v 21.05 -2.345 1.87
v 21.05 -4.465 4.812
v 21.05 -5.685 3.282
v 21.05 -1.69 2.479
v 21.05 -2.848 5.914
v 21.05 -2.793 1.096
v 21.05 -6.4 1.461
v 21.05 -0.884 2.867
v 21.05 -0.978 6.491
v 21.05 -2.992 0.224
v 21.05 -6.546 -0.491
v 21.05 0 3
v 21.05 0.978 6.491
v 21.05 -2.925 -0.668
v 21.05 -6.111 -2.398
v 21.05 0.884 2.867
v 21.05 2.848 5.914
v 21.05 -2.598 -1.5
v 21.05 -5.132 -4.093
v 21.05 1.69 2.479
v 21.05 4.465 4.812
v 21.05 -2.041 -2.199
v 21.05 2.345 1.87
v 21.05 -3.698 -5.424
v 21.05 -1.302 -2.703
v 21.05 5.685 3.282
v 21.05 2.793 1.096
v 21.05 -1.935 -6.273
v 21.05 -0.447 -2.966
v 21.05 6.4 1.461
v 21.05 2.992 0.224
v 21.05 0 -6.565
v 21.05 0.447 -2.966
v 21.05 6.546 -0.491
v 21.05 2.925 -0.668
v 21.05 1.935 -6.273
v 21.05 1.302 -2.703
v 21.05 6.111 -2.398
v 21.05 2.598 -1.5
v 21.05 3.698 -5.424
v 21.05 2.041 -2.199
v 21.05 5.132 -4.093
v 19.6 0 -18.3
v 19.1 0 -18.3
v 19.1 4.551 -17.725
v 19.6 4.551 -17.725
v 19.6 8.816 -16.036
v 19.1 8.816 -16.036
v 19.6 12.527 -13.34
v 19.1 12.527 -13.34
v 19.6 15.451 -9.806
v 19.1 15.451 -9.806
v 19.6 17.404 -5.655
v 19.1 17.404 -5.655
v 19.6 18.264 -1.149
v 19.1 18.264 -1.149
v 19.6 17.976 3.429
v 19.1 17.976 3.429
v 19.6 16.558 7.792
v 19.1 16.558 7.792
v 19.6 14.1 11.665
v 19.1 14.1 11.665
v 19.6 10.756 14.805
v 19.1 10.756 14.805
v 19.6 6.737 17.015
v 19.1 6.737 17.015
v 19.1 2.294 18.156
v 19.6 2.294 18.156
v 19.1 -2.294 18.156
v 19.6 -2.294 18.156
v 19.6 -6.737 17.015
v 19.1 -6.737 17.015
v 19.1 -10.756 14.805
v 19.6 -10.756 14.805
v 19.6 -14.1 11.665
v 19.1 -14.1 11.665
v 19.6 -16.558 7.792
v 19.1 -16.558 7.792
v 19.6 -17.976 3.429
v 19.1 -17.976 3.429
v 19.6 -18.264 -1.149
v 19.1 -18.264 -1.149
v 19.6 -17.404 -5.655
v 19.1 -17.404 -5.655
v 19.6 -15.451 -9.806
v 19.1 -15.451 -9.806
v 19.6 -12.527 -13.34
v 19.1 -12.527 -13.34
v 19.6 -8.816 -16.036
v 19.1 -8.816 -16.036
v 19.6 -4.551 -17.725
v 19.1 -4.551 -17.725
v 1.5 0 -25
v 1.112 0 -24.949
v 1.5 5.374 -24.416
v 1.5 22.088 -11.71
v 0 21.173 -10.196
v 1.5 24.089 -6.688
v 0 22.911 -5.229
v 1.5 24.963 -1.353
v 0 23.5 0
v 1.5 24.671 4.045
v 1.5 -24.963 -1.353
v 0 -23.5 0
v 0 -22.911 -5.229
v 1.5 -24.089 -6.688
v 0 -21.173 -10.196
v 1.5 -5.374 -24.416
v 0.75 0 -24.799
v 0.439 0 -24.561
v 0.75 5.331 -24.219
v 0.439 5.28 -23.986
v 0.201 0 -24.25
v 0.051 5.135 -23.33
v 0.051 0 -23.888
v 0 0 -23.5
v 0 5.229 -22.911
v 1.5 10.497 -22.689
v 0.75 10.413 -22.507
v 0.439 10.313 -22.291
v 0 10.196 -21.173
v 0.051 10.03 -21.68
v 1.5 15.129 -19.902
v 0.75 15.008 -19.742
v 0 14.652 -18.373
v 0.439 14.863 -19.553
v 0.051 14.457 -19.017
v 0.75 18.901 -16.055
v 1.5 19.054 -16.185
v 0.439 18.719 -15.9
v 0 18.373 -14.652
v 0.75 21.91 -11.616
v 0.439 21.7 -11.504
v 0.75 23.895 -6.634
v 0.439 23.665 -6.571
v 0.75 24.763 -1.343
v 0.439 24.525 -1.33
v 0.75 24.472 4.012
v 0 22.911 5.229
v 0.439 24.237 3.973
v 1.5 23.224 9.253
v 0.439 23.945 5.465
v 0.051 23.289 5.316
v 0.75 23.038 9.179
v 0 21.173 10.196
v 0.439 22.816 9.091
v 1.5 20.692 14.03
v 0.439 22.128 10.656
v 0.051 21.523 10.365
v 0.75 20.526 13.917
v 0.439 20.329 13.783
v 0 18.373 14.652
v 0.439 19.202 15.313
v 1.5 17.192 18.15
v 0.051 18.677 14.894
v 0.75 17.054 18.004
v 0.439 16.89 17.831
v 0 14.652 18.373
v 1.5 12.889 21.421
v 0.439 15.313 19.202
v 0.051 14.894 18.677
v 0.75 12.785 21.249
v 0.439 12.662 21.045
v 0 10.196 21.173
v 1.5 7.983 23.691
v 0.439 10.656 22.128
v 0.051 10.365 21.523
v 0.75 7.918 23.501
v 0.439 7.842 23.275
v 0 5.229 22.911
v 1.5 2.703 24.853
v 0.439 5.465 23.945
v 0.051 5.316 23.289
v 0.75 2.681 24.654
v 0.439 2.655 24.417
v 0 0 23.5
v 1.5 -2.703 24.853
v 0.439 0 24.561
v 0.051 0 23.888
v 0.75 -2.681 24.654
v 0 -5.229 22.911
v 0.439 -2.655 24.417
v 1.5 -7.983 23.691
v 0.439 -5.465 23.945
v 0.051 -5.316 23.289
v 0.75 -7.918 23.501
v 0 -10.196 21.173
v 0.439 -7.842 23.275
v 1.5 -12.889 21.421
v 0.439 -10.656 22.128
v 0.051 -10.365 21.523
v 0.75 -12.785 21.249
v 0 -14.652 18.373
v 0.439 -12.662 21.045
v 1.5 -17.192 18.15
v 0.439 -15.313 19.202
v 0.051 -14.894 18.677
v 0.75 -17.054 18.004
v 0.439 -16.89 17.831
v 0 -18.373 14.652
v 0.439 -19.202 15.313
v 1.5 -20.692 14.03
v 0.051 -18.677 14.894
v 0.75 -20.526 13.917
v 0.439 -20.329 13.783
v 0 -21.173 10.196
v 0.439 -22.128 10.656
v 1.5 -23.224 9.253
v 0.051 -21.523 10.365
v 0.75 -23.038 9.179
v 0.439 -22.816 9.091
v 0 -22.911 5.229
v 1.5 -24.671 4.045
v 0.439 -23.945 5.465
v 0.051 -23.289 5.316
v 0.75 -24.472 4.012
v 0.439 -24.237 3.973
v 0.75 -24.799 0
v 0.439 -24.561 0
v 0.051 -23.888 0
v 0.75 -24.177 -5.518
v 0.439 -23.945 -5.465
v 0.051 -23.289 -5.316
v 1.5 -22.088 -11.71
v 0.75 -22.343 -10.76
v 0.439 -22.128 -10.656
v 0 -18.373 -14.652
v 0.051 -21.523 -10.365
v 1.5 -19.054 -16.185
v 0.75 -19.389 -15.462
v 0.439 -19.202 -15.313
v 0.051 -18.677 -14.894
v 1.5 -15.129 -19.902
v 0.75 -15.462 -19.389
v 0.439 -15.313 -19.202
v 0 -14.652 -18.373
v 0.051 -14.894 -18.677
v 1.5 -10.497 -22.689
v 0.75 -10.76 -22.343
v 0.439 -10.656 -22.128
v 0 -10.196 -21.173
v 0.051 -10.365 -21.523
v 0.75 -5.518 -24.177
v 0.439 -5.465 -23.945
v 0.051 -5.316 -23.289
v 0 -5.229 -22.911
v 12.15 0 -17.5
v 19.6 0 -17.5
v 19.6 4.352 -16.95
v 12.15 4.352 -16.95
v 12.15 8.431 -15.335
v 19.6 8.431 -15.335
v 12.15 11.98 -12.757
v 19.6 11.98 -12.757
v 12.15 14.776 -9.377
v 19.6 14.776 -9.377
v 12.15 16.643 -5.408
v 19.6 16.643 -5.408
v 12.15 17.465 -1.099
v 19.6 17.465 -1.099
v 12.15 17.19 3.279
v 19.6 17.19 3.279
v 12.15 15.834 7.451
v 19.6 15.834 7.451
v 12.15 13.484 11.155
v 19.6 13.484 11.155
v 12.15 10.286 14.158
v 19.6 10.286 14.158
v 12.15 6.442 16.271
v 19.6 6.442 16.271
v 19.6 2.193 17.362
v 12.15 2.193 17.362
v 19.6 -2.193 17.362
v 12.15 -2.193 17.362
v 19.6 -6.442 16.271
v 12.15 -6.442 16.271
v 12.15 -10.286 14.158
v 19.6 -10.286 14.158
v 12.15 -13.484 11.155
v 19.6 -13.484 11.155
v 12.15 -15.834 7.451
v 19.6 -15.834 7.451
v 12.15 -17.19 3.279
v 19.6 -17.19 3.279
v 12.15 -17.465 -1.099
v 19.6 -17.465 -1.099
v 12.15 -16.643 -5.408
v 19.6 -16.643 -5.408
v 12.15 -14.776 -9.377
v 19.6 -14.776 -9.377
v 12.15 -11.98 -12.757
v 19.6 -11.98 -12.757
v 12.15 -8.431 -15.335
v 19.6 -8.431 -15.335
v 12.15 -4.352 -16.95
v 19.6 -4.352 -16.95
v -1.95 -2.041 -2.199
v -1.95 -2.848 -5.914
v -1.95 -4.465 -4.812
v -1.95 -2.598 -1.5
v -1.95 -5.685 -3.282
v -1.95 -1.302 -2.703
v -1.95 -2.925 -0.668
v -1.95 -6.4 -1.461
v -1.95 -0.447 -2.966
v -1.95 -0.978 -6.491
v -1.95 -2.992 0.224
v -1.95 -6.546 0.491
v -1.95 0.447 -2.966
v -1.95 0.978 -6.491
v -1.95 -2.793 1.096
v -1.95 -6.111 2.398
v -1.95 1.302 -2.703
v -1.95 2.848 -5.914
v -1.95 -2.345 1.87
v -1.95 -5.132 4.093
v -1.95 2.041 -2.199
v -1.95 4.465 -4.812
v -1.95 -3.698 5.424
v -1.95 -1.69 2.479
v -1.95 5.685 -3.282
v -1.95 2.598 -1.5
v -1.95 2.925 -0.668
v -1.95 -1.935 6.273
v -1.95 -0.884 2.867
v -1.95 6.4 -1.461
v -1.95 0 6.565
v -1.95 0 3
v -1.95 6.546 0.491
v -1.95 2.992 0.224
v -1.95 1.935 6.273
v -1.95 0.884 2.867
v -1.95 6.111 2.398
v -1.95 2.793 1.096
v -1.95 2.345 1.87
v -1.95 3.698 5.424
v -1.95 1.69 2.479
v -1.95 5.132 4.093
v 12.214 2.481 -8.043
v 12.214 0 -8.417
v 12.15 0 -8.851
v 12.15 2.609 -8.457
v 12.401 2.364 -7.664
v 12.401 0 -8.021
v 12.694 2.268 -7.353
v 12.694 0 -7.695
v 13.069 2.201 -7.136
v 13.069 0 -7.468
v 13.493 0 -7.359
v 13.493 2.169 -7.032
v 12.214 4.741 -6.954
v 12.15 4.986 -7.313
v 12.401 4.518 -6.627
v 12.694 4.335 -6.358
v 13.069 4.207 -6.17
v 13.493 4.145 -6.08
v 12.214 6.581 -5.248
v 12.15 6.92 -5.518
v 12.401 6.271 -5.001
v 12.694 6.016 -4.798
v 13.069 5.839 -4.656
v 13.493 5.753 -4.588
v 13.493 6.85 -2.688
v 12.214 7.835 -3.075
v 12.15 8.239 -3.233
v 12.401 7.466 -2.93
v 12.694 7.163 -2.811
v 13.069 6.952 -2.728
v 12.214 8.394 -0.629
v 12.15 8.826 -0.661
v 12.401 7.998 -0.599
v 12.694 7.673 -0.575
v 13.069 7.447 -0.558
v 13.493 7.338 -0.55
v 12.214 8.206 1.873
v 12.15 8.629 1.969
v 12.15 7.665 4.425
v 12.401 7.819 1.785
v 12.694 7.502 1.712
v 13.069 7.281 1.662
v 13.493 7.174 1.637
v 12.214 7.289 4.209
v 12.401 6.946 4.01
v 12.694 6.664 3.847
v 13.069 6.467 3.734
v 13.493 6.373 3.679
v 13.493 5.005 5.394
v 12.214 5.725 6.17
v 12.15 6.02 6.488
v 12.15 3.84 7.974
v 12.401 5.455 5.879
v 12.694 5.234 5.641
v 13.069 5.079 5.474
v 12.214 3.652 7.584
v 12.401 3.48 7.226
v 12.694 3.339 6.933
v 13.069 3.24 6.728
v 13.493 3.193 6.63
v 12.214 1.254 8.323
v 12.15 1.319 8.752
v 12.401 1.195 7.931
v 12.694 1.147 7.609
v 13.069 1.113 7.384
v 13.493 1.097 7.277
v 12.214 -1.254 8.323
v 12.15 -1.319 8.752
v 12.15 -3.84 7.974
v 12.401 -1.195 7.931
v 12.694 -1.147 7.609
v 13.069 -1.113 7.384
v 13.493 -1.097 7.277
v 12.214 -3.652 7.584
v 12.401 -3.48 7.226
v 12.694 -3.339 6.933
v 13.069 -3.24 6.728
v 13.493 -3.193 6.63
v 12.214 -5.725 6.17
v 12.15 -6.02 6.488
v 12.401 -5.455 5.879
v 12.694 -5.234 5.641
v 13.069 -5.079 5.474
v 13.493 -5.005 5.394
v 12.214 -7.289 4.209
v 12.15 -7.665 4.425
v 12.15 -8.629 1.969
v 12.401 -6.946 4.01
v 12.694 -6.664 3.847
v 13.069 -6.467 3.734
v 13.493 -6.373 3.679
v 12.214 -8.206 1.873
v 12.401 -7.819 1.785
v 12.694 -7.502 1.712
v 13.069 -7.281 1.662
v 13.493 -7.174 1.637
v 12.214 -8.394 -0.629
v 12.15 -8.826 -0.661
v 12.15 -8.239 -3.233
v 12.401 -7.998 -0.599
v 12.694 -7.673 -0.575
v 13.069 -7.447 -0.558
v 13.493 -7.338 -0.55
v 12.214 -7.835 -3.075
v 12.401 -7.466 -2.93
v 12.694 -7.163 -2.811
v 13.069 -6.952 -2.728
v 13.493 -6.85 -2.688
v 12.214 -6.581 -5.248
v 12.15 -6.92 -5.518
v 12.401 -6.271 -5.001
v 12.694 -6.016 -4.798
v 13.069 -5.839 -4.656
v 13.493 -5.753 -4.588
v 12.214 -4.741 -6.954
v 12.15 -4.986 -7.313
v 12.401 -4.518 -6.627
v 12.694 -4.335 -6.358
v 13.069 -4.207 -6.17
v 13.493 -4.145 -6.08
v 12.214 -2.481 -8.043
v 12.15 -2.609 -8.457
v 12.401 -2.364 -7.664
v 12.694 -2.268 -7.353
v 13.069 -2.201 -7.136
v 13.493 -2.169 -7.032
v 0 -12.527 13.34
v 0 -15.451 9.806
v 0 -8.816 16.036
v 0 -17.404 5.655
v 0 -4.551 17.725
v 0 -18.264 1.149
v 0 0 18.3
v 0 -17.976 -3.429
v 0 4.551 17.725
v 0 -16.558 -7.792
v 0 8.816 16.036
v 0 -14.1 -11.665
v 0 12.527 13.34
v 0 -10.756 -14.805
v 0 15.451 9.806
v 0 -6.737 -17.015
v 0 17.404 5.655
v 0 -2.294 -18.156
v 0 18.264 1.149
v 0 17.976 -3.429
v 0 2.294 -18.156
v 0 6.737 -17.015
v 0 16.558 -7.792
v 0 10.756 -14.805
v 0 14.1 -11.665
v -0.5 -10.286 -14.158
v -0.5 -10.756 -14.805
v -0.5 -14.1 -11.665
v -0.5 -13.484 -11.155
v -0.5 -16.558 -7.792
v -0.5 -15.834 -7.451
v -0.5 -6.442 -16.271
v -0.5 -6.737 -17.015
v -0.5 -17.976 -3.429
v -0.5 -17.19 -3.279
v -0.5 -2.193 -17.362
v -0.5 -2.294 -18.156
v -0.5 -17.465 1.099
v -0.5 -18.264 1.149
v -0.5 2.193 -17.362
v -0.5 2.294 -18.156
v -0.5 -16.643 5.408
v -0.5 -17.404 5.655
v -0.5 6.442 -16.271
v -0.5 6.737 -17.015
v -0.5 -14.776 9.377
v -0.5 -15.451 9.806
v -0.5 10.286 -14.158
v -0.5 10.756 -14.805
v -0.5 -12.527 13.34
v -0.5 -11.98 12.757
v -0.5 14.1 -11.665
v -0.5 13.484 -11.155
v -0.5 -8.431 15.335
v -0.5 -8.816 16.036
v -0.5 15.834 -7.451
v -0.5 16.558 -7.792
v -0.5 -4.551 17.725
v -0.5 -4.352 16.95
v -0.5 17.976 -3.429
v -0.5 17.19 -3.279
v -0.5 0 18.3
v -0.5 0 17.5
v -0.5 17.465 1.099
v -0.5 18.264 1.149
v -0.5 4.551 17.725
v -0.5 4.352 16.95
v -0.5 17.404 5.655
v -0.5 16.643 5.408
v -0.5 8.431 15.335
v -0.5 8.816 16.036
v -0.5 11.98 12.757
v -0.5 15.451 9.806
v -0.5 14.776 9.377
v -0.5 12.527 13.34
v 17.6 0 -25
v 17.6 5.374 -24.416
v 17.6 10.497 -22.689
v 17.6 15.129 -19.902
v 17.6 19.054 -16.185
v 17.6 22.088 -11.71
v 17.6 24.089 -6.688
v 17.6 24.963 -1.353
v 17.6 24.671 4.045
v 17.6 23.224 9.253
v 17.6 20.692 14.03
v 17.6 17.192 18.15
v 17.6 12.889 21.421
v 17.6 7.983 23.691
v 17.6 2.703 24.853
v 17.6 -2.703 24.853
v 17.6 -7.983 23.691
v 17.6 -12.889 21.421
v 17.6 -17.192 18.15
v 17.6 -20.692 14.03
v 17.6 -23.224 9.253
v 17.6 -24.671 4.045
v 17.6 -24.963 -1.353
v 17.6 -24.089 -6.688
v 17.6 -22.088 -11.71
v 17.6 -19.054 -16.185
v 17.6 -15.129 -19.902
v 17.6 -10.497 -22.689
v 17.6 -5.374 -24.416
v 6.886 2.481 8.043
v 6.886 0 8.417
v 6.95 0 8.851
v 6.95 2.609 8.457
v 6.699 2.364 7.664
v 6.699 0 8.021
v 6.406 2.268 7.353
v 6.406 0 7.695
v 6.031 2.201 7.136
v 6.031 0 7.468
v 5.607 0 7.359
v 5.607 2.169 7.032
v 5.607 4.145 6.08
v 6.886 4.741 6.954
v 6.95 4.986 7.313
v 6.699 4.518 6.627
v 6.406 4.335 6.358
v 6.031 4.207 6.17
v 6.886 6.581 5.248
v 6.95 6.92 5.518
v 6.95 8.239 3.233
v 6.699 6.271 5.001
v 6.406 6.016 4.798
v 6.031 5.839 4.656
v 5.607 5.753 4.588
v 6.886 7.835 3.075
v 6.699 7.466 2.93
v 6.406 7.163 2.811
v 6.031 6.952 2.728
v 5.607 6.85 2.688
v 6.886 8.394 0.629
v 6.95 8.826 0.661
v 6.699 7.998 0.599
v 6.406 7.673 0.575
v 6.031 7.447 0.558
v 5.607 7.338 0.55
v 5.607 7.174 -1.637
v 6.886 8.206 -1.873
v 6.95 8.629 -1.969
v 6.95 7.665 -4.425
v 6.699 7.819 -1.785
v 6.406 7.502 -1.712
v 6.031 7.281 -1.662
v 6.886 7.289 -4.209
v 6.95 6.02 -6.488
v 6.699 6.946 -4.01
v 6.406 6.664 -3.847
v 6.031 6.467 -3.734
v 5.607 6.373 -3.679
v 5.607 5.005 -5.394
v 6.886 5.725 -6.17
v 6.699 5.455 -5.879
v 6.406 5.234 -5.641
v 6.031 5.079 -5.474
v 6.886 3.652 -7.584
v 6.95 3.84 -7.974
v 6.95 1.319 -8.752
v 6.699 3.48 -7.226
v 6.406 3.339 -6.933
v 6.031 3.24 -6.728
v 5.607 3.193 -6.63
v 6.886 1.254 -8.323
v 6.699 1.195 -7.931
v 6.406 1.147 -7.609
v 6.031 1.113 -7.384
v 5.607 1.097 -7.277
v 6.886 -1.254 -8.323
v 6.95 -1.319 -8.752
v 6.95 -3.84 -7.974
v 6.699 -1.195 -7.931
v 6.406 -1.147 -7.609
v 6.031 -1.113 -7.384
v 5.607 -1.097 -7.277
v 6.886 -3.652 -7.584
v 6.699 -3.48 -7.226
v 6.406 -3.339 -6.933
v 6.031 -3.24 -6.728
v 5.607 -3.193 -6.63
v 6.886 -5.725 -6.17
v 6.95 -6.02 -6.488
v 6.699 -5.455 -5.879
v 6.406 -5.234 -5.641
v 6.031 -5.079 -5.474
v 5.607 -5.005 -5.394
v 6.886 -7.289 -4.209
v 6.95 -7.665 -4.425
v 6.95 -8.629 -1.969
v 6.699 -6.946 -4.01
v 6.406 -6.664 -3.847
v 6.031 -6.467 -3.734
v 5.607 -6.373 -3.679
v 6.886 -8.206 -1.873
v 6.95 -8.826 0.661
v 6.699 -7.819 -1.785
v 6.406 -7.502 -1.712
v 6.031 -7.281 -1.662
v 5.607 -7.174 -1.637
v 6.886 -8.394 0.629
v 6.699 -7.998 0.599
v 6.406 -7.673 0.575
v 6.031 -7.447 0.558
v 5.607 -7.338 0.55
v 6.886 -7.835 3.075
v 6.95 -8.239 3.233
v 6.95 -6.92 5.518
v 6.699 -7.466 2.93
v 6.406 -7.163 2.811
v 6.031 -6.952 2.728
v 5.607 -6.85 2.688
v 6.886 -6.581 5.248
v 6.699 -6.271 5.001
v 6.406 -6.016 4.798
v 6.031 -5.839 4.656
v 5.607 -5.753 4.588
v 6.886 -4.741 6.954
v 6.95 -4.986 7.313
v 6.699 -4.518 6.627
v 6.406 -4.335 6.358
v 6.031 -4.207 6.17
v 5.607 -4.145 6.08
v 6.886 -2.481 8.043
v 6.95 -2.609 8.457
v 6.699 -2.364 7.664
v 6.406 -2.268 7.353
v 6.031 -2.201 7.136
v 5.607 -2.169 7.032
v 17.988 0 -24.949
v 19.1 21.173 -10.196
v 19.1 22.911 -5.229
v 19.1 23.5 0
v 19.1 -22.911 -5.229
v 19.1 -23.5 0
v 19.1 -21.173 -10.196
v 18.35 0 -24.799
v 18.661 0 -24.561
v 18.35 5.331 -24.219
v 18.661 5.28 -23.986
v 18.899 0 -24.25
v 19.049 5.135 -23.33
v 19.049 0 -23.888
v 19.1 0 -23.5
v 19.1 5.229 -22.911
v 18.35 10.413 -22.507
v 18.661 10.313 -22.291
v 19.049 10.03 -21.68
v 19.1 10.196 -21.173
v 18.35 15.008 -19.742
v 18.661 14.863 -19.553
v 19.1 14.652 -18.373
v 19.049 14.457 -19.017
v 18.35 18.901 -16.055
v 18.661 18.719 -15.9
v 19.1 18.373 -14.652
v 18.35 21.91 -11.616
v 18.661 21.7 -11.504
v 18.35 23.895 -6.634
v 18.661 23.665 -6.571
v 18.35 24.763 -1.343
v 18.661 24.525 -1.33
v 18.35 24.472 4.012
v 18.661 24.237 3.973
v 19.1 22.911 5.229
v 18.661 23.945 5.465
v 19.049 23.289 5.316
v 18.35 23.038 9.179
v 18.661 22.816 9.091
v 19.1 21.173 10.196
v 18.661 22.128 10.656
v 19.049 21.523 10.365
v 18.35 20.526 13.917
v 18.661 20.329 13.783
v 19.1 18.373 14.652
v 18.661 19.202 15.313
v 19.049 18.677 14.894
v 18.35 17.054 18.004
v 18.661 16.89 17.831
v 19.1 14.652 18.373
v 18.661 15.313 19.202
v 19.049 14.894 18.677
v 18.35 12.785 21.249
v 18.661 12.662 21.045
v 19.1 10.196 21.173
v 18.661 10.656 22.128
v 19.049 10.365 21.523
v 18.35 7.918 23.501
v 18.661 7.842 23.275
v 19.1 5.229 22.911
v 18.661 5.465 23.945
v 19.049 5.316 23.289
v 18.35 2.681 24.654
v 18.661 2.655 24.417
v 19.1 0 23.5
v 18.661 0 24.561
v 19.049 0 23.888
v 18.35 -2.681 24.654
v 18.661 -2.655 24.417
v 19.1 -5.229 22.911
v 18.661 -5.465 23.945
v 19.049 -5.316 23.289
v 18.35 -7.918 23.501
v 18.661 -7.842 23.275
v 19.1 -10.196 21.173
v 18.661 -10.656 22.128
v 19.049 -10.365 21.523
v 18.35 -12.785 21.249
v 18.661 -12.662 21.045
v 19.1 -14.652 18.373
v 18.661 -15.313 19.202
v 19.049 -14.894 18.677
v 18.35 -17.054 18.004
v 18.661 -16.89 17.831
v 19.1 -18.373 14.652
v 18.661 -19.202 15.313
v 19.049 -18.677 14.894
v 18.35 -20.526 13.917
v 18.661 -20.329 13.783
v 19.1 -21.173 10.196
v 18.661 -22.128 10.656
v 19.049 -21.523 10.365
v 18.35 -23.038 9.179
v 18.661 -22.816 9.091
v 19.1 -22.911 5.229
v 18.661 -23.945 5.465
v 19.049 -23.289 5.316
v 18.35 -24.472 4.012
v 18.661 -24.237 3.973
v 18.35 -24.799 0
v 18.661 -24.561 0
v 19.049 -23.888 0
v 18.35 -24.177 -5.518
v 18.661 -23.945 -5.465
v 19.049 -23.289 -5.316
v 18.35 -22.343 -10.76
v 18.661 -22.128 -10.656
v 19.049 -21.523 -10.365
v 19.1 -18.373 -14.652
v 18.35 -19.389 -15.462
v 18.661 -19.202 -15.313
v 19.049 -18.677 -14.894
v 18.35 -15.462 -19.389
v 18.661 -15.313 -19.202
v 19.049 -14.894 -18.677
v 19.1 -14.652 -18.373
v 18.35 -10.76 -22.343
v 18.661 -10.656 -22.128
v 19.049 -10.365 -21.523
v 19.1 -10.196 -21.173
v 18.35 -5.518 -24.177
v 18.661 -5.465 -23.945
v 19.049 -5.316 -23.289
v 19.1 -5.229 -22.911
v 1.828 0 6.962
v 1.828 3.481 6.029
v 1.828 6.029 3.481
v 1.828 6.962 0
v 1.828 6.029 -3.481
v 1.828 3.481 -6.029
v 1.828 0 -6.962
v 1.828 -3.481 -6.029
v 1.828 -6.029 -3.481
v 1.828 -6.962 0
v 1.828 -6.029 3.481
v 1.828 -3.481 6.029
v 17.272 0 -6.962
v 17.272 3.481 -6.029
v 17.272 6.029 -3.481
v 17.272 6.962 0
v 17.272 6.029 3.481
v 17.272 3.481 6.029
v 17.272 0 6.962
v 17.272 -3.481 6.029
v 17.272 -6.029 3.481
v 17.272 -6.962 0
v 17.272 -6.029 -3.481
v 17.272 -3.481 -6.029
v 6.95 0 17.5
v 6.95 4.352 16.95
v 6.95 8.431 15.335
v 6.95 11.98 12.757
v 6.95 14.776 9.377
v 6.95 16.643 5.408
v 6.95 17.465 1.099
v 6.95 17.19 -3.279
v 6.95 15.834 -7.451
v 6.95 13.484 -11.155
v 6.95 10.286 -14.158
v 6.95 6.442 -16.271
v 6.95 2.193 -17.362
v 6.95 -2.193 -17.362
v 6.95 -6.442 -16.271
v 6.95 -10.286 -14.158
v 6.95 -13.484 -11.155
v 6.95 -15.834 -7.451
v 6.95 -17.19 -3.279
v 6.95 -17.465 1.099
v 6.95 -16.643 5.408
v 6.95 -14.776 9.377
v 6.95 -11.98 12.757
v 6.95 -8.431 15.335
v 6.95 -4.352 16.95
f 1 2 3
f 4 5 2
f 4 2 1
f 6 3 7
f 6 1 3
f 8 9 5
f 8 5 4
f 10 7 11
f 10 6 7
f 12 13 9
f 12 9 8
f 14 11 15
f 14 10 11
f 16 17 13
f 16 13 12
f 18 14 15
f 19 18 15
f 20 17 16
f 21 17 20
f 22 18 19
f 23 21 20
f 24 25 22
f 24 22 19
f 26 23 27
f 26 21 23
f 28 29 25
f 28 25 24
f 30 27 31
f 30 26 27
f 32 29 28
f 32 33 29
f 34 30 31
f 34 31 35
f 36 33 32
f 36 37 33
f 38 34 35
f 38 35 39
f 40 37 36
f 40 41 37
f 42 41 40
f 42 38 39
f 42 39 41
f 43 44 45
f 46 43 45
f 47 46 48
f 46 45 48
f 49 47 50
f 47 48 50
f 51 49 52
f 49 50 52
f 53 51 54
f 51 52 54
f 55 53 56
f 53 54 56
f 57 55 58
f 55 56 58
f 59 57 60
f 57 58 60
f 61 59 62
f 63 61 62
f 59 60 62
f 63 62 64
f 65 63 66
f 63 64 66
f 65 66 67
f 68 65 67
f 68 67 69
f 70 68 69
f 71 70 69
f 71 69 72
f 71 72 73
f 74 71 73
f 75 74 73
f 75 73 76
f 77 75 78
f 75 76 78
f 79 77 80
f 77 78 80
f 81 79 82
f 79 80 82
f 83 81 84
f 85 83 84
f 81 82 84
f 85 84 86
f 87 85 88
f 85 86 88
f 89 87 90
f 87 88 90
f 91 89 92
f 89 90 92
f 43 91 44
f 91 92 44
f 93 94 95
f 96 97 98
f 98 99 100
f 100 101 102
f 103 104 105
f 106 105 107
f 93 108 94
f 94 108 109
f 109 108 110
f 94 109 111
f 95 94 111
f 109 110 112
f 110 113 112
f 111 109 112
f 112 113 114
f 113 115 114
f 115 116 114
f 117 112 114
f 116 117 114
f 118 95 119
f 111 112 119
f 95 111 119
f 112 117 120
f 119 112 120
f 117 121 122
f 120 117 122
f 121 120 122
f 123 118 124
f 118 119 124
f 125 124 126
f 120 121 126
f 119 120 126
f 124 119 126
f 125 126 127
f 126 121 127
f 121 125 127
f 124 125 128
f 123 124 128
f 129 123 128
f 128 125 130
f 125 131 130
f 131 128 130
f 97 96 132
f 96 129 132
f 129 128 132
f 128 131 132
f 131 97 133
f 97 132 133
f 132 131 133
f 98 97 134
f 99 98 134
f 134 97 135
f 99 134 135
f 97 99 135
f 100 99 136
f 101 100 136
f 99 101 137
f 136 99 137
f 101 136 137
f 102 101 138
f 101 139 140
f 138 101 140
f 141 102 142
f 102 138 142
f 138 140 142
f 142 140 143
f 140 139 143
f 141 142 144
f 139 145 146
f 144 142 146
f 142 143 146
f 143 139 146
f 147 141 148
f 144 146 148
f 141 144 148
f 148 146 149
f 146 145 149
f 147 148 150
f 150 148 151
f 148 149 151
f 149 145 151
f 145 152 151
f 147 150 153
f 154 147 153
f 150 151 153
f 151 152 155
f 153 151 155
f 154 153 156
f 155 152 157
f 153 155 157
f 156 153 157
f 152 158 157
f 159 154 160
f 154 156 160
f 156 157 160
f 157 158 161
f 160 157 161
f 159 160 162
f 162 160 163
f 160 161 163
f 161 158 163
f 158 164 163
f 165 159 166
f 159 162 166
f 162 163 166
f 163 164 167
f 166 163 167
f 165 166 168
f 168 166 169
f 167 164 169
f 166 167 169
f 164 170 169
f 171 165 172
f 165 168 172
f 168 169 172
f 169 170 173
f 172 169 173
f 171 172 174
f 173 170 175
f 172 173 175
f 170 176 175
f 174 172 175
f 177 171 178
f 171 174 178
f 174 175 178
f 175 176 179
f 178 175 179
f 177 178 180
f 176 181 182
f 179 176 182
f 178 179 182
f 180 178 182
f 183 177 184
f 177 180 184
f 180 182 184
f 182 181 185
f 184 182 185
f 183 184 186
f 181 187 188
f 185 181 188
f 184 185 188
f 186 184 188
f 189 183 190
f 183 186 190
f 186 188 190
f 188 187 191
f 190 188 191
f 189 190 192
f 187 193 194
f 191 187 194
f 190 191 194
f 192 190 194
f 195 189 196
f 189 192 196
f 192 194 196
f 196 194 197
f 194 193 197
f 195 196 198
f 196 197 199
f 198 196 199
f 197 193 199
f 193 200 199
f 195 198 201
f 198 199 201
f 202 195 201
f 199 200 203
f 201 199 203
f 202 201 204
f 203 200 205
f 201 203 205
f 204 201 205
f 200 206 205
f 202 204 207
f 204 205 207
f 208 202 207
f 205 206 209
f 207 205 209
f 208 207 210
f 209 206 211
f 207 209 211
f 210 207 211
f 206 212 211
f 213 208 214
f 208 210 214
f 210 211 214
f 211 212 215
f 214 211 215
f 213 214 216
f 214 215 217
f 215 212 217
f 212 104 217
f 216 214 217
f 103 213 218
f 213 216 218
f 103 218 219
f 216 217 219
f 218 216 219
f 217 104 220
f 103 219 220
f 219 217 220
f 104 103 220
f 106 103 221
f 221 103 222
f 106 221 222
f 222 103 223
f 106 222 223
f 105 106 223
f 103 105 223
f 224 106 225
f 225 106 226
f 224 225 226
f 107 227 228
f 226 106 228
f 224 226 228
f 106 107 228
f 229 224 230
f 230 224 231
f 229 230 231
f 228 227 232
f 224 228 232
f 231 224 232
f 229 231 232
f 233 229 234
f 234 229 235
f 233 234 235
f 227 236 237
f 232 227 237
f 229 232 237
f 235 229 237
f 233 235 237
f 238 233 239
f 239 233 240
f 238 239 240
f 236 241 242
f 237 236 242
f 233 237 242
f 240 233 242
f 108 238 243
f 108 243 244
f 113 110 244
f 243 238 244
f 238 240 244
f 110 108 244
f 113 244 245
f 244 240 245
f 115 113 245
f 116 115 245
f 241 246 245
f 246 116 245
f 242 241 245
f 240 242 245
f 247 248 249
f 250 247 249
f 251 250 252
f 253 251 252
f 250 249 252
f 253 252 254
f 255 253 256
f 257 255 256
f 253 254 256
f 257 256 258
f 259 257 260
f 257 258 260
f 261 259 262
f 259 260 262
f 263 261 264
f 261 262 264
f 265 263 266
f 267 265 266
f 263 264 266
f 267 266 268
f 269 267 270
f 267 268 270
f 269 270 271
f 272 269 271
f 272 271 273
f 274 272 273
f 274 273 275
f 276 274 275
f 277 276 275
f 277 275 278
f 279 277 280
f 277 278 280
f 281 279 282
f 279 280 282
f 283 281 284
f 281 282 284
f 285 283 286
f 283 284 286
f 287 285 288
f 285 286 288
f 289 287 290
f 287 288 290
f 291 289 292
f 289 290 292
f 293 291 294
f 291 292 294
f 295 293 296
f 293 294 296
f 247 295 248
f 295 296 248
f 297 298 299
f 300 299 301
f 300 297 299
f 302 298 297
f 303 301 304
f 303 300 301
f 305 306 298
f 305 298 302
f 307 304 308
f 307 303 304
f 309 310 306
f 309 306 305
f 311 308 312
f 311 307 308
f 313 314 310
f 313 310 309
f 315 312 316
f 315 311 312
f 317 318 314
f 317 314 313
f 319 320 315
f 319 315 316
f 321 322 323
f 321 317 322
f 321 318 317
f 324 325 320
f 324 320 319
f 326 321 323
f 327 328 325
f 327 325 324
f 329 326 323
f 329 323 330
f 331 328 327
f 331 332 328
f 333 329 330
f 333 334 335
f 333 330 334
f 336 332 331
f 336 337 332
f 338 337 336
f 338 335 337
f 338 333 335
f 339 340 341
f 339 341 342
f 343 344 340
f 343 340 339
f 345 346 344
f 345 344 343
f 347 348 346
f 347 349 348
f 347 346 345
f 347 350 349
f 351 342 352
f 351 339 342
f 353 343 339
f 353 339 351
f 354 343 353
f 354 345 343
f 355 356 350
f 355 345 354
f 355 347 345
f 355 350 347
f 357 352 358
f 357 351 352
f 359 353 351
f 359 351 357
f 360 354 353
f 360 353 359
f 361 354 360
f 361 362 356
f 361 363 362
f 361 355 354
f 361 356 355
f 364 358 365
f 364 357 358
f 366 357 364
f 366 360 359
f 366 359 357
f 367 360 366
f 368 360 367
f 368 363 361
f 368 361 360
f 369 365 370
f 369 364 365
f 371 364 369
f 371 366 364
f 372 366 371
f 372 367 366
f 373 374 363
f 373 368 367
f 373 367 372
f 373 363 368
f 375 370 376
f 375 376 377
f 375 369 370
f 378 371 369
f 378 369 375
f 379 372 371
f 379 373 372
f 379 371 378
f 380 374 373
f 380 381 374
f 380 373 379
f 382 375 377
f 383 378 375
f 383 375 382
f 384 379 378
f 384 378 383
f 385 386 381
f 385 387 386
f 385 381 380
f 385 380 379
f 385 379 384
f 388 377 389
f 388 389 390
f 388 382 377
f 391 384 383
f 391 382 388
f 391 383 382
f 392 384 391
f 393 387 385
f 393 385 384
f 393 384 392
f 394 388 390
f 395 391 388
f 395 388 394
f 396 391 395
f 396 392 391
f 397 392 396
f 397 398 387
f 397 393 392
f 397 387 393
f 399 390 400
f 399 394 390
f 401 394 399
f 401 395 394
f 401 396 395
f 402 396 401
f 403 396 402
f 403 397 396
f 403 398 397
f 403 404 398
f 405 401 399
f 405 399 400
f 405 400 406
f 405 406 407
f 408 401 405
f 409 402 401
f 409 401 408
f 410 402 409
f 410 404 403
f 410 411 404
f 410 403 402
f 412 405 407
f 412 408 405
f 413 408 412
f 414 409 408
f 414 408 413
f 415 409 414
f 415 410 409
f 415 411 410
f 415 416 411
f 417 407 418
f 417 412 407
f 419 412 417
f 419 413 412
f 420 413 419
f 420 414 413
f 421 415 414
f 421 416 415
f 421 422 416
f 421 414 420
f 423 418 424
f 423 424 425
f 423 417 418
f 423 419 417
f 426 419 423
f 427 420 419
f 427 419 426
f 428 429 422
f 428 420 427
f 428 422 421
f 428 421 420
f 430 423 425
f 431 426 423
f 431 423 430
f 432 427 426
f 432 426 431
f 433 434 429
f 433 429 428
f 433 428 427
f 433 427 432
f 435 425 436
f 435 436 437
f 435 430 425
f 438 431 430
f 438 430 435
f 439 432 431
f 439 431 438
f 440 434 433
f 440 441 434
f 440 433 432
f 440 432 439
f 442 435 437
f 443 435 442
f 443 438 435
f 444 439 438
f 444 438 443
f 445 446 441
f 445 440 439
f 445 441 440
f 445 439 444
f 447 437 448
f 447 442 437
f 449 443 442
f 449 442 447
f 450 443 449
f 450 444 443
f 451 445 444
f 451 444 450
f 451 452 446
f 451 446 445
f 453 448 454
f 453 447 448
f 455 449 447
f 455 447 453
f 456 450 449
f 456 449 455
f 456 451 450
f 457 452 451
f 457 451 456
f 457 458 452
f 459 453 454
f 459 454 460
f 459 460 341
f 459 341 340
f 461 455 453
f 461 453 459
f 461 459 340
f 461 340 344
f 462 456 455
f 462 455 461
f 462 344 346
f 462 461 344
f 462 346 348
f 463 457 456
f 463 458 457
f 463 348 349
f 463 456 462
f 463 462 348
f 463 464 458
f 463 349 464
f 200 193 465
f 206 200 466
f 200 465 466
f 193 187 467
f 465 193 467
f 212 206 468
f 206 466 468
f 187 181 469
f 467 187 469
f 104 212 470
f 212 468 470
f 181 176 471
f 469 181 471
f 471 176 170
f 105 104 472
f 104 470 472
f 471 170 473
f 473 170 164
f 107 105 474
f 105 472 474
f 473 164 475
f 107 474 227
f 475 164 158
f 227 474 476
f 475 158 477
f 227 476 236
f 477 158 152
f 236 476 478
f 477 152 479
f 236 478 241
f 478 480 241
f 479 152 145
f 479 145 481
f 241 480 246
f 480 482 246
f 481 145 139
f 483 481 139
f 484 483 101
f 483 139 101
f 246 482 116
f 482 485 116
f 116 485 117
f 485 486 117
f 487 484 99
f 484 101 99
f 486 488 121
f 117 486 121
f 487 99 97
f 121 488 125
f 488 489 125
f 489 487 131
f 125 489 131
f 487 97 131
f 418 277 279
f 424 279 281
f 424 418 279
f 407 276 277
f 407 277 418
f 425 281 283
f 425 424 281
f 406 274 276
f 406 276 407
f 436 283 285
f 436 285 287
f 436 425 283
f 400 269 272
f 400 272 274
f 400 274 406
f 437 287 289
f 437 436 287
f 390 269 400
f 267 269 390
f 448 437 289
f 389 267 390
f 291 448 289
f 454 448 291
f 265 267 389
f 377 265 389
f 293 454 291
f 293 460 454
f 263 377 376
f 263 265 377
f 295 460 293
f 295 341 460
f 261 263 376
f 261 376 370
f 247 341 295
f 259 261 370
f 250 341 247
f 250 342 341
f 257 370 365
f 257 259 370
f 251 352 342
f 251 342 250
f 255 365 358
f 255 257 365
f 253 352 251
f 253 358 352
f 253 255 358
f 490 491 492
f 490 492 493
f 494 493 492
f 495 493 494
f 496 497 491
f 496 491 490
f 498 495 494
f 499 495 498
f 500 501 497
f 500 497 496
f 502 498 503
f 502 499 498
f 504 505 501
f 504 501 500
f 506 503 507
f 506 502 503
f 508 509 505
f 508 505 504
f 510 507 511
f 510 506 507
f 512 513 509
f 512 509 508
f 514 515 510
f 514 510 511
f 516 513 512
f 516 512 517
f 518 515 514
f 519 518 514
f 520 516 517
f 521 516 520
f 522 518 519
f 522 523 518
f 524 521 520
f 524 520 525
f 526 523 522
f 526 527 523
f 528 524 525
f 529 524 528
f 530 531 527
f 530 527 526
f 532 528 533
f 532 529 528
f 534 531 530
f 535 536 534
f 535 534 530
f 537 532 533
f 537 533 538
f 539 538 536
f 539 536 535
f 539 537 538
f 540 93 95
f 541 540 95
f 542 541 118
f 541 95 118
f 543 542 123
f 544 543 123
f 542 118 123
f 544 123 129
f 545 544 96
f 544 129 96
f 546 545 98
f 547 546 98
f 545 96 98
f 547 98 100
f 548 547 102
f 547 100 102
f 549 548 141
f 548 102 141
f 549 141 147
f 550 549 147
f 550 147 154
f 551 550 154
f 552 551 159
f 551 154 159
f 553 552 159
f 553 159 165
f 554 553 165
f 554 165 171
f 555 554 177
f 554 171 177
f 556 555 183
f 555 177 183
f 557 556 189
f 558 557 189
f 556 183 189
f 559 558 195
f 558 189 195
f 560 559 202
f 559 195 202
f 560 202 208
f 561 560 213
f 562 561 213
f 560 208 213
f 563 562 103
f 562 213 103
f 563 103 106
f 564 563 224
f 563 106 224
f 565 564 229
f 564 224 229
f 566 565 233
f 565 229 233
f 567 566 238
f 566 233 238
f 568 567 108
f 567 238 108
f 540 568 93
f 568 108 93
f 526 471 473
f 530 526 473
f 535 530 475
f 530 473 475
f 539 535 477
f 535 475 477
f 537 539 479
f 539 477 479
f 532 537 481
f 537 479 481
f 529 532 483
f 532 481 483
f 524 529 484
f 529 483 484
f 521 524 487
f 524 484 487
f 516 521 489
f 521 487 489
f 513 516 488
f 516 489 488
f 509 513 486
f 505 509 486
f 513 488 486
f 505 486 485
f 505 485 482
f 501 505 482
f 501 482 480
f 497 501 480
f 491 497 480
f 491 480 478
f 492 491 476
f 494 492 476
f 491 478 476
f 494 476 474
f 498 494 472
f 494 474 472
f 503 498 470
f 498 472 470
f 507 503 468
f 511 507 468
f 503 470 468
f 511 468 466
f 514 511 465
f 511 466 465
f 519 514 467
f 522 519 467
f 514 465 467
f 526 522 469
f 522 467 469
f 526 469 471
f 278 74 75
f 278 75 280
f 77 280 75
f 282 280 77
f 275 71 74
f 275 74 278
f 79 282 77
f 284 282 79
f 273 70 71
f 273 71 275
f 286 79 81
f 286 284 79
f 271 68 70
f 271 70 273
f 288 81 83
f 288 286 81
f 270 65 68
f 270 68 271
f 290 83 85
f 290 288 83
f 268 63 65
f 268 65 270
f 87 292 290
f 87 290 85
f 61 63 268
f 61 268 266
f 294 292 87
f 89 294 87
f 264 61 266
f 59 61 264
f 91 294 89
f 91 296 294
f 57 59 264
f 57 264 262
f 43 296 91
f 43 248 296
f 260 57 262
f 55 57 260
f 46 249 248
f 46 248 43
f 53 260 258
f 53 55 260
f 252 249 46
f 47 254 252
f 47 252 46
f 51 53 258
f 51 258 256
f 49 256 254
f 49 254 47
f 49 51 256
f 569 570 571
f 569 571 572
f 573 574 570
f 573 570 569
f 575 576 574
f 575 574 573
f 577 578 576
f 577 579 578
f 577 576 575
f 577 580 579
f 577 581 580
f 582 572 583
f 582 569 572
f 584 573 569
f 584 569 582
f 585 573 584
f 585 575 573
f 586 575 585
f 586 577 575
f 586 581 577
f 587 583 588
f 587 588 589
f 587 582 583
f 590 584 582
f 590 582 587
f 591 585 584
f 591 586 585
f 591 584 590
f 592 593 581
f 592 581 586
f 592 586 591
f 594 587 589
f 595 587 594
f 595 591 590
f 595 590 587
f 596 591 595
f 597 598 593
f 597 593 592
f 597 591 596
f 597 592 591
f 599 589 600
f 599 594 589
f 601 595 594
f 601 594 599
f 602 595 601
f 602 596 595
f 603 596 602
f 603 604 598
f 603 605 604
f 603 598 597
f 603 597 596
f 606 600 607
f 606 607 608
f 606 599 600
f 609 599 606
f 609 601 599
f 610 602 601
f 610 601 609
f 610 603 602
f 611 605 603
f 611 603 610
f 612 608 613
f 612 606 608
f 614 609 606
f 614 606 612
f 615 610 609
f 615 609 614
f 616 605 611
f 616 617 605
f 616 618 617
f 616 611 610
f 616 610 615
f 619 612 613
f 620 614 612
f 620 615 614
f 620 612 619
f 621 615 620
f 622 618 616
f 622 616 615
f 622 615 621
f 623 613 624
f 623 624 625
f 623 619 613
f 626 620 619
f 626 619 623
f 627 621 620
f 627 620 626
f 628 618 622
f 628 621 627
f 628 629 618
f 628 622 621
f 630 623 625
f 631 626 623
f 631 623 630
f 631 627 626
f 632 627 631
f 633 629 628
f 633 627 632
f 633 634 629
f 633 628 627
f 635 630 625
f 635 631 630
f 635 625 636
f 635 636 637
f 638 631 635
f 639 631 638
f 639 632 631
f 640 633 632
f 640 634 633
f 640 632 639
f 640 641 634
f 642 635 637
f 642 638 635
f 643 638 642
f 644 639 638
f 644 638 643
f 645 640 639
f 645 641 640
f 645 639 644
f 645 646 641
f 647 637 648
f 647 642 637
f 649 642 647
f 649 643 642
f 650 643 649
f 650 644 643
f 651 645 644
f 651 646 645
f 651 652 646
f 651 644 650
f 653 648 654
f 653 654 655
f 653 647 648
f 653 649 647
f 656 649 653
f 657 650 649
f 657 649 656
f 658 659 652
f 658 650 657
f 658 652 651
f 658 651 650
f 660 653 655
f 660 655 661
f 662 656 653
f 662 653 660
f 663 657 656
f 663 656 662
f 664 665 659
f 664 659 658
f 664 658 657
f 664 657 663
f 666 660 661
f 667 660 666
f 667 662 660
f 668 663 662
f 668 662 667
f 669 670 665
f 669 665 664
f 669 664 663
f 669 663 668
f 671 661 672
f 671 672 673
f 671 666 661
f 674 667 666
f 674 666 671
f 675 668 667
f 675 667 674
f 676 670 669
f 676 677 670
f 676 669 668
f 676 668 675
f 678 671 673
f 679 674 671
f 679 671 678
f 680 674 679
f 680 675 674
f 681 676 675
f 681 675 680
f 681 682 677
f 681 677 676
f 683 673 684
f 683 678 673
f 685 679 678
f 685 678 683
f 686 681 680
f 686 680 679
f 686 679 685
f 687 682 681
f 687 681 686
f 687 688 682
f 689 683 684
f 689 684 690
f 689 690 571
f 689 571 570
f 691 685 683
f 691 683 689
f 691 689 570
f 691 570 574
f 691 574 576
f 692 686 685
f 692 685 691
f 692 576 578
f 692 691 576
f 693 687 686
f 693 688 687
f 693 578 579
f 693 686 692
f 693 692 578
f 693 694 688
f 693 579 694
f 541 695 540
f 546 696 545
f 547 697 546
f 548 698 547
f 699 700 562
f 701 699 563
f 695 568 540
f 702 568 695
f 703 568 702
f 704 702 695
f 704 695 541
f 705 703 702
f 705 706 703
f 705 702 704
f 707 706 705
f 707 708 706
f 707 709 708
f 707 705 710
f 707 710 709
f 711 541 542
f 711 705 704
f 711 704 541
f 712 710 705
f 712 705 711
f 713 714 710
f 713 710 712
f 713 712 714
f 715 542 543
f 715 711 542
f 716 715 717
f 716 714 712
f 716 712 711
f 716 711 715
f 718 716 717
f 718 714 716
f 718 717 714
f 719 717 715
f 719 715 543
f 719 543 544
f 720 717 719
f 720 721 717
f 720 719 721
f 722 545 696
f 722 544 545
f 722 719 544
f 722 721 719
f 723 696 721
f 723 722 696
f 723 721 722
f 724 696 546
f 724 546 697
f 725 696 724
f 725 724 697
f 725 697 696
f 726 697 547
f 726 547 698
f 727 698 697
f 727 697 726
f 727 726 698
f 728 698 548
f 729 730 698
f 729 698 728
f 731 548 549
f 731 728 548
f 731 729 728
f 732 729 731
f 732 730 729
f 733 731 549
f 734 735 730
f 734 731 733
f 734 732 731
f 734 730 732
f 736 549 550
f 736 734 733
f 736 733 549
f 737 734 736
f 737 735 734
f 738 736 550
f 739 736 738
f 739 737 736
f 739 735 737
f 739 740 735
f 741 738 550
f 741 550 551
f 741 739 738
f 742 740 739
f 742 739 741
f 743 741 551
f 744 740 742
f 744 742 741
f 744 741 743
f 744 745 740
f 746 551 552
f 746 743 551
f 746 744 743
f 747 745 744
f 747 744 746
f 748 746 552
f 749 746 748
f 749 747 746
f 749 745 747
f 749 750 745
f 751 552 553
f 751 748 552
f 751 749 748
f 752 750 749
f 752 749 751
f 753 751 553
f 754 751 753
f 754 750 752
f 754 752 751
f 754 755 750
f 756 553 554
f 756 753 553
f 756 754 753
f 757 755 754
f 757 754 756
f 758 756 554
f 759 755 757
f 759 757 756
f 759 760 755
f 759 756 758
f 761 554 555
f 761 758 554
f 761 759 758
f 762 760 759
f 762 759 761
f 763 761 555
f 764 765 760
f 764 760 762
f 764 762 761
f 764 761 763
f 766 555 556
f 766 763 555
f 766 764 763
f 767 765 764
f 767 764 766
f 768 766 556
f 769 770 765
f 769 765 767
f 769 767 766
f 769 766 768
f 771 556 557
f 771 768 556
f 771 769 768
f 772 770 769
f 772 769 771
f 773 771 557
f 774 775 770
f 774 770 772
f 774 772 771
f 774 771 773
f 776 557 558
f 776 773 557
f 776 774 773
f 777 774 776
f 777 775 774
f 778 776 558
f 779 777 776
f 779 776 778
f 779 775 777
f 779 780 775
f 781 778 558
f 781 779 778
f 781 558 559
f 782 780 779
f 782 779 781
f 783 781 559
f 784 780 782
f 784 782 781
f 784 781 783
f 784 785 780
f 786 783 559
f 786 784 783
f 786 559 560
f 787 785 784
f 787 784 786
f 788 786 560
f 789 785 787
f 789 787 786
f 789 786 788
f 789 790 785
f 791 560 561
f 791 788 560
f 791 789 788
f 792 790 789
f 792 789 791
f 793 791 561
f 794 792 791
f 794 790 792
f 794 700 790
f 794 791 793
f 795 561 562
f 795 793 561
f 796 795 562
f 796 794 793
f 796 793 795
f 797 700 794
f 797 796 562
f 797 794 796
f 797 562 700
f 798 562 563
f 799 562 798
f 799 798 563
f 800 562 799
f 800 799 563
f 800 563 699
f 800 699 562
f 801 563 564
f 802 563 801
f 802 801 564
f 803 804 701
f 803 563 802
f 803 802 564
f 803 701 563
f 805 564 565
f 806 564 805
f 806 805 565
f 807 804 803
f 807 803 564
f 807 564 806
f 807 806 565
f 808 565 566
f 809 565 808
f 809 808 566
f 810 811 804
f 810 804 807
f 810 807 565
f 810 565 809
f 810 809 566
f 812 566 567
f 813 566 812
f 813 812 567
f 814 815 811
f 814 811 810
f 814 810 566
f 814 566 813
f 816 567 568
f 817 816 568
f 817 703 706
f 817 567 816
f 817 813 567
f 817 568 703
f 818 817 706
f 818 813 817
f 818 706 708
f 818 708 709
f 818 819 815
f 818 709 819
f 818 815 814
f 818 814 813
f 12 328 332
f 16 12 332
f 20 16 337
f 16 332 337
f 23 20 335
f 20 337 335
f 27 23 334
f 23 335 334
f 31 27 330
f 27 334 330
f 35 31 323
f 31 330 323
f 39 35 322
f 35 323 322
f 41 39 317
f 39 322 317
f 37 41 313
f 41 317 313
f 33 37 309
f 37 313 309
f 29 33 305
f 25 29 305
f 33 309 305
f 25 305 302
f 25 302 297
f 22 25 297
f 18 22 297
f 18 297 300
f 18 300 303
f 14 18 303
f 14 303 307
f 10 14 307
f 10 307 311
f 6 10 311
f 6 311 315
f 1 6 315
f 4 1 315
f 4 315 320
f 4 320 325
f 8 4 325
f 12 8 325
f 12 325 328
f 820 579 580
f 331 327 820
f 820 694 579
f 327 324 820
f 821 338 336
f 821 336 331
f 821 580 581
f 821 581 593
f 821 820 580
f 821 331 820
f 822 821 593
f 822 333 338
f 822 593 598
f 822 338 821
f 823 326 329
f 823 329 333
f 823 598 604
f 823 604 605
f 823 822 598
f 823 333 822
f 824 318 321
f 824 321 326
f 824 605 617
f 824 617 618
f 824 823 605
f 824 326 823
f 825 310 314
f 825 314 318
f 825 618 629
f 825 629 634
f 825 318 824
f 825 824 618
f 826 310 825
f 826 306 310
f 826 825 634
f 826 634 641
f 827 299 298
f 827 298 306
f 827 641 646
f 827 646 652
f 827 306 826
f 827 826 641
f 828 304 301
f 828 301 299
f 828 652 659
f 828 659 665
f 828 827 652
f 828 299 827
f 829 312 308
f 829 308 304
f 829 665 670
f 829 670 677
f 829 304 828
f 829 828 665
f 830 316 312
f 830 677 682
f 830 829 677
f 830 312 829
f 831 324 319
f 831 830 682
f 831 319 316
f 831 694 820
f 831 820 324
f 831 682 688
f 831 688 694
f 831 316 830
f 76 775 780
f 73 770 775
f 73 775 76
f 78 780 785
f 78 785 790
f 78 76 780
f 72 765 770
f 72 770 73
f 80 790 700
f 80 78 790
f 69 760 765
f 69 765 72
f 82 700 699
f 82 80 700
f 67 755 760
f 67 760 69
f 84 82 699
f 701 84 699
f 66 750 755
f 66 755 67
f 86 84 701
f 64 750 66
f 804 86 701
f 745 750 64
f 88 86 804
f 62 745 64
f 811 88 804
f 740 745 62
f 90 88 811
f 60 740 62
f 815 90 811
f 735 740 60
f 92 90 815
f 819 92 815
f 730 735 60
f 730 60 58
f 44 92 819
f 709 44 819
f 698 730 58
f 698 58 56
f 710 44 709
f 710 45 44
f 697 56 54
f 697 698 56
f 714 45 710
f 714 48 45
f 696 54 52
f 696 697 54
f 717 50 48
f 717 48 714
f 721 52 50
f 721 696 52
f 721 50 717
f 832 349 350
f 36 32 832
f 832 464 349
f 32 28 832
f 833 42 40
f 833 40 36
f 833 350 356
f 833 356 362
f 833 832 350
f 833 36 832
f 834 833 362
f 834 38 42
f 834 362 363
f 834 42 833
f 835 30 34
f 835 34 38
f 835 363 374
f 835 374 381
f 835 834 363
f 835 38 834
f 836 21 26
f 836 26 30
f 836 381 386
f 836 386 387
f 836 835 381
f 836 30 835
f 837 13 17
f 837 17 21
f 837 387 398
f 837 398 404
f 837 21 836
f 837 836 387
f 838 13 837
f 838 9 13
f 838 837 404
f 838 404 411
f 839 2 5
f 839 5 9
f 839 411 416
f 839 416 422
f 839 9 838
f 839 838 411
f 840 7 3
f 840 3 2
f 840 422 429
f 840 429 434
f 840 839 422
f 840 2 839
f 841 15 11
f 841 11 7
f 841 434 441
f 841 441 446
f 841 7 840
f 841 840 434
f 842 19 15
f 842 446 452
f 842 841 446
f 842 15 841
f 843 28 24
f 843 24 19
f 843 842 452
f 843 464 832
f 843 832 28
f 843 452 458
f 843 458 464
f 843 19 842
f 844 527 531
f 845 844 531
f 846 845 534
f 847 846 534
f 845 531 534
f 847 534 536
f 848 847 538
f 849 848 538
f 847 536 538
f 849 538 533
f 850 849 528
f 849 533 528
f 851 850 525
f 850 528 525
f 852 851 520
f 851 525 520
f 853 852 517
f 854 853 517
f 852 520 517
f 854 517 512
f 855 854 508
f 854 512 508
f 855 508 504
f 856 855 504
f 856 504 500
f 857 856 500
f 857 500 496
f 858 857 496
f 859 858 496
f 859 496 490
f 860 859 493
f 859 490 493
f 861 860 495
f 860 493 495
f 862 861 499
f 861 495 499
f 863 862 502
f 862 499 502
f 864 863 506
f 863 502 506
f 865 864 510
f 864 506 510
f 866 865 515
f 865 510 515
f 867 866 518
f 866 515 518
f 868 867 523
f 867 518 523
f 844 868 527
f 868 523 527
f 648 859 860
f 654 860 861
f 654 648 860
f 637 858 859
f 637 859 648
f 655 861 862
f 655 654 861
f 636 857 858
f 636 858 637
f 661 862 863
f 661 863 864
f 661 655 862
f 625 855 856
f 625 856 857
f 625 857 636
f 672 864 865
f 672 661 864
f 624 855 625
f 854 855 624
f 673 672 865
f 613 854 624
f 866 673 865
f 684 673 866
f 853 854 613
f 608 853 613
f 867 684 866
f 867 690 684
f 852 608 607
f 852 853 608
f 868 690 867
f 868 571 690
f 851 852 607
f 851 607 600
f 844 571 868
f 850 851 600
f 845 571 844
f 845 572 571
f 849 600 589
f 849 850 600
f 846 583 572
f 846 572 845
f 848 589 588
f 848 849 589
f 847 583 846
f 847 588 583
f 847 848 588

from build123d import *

# Parameters (mm, degrees)
ESQUISSE1_R             = 25
BOSS_EXTRU_1_DEPTH      = 19.1
ESQUISSE2_R             = 18.3
BOSS_EXTRU_2_DEPTH      = 0.5
CONG_1_R                = 1.5
ESQUISSE3_R             = 18.3
BOSS_EXTRU_3_DEPTH      = 0.5
ESQUISSE4_R             = 17.5
ENL_V_MAT_EXTRU_1_DEPTH = 7.45
ESQUISSE5_R             = 17.5
ENL_V_MAT_EXTRU_2_DEPTH = 7.45
ESQUISSE6_R             = 7.5
BOSS_EXTRU_4_DEPTH      = 8.9
BOSS_EXTRU_4_TAPER      = 6
CONG_2_R                = 1.5
ESQUISSE7_R             = 7.5
BOSS_EXTRU_5_DEPTH      = 8.9
BOSS_EXTRU_5_TAPER      = 6
CONG_3_R                = 1.5
ESQUISSE8_R             = 3
ENL_V_MAT_EXTRU_3_DEPTH = 28.9


with BuildPart() as part:
    # Esquisse1 → Boss.-Extru.1 (new body)
    with BuildSketch(Plane(origin=(0, 0, 0), x_dir=(0, 0, -1), z_dir=(1, 0, 0))):
        Circle(ESQUISSE1_R)
    extrude(amount=BOSS_EXTRU_1_DEPTH)

    # Esquisse2 → Boss.-Extru.2 (add)
    with BuildSketch(Plane(origin=(19.1, 0, 0), x_dir=(0, 0, -1), z_dir=(1, 0, 0))):
        Circle(ESQUISSE2_R)
    extrude(amount=BOSS_EXTRU_2_DEPTH)

    # Congé1
    cong_1_edges = [part.edges().sort_by_distance(p)[0] for p in [
        (0, 0, 25),
        (19.1, 0, 25),
    ]]
    fillet(cong_1_edges, radius=CONG_1_R)

    # Esquisse3 → Boss.-Extru.3 (add)
    with BuildSketch(Plane.ZY):
        Circle(ESQUISSE3_R)
    extrude(amount=BOSS_EXTRU_3_DEPTH)

    # Esquisse4 → Enlèv. mat.-Extru.1 (cut)
    with BuildSketch(Plane.ZY.offset(0.5)):
        Circle(ESQUISSE4_R)
    extrude(amount=-ENL_V_MAT_EXTRU_1_DEPTH, mode=Mode.SUBTRACT)

    # Esquisse5 → Enlèv. mat.-Extru.2 (cut)
    with BuildSketch(Plane(origin=(19.6, 0, 0), x_dir=(0, 0, -1), z_dir=(1, 0, 0))):
        Circle(ESQUISSE5_R)
    extrude(amount=-ENL_V_MAT_EXTRU_2_DEPTH, mode=Mode.SUBTRACT)

    # Esquisse6 → Boss.-Extru.4 (add)
    with BuildSketch(Plane(origin=(12.15, 0, 0), x_dir=(0, 0, -1), z_dir=(1, 0, 0))):
        Circle(ESQUISSE6_R)
    extrude(amount=BOSS_EXTRU_4_DEPTH, taper=BOSS_EXTRU_4_TAPER)

    # Congé2
    cong_2_edges = [part.edges().sort_by_distance(p)[0] for p in [
        (12.15, 0, 7.5),
    ]]
    fillet(cong_2_edges, radius=CONG_2_R)

    # Esquisse7 → Boss.-Extru.5 (add)
    with BuildSketch(Plane.ZY.offset(-6.95)):
        Circle(ESQUISSE7_R)
    extrude(amount=BOSS_EXTRU_5_DEPTH, taper=BOSS_EXTRU_5_TAPER)

    # Congé3
    cong_3_edges = [part.edges().sort_by_distance(p)[0] for p in [
        (6.95, 0, -7.5),
    ]]
    fillet(cong_3_edges, radius=CONG_3_R)

    # Esquisse8 → Enlèv. mat.-Extru.3 (cut)
    with BuildSketch(Plane.ZY.offset(1.95)):
        Circle(ESQUISSE8_R)
    extrude(amount=-ENL_V_MAT_EXTRU_3_DEPTH, mode=Mode.SUBTRACT)


solid = part.part
